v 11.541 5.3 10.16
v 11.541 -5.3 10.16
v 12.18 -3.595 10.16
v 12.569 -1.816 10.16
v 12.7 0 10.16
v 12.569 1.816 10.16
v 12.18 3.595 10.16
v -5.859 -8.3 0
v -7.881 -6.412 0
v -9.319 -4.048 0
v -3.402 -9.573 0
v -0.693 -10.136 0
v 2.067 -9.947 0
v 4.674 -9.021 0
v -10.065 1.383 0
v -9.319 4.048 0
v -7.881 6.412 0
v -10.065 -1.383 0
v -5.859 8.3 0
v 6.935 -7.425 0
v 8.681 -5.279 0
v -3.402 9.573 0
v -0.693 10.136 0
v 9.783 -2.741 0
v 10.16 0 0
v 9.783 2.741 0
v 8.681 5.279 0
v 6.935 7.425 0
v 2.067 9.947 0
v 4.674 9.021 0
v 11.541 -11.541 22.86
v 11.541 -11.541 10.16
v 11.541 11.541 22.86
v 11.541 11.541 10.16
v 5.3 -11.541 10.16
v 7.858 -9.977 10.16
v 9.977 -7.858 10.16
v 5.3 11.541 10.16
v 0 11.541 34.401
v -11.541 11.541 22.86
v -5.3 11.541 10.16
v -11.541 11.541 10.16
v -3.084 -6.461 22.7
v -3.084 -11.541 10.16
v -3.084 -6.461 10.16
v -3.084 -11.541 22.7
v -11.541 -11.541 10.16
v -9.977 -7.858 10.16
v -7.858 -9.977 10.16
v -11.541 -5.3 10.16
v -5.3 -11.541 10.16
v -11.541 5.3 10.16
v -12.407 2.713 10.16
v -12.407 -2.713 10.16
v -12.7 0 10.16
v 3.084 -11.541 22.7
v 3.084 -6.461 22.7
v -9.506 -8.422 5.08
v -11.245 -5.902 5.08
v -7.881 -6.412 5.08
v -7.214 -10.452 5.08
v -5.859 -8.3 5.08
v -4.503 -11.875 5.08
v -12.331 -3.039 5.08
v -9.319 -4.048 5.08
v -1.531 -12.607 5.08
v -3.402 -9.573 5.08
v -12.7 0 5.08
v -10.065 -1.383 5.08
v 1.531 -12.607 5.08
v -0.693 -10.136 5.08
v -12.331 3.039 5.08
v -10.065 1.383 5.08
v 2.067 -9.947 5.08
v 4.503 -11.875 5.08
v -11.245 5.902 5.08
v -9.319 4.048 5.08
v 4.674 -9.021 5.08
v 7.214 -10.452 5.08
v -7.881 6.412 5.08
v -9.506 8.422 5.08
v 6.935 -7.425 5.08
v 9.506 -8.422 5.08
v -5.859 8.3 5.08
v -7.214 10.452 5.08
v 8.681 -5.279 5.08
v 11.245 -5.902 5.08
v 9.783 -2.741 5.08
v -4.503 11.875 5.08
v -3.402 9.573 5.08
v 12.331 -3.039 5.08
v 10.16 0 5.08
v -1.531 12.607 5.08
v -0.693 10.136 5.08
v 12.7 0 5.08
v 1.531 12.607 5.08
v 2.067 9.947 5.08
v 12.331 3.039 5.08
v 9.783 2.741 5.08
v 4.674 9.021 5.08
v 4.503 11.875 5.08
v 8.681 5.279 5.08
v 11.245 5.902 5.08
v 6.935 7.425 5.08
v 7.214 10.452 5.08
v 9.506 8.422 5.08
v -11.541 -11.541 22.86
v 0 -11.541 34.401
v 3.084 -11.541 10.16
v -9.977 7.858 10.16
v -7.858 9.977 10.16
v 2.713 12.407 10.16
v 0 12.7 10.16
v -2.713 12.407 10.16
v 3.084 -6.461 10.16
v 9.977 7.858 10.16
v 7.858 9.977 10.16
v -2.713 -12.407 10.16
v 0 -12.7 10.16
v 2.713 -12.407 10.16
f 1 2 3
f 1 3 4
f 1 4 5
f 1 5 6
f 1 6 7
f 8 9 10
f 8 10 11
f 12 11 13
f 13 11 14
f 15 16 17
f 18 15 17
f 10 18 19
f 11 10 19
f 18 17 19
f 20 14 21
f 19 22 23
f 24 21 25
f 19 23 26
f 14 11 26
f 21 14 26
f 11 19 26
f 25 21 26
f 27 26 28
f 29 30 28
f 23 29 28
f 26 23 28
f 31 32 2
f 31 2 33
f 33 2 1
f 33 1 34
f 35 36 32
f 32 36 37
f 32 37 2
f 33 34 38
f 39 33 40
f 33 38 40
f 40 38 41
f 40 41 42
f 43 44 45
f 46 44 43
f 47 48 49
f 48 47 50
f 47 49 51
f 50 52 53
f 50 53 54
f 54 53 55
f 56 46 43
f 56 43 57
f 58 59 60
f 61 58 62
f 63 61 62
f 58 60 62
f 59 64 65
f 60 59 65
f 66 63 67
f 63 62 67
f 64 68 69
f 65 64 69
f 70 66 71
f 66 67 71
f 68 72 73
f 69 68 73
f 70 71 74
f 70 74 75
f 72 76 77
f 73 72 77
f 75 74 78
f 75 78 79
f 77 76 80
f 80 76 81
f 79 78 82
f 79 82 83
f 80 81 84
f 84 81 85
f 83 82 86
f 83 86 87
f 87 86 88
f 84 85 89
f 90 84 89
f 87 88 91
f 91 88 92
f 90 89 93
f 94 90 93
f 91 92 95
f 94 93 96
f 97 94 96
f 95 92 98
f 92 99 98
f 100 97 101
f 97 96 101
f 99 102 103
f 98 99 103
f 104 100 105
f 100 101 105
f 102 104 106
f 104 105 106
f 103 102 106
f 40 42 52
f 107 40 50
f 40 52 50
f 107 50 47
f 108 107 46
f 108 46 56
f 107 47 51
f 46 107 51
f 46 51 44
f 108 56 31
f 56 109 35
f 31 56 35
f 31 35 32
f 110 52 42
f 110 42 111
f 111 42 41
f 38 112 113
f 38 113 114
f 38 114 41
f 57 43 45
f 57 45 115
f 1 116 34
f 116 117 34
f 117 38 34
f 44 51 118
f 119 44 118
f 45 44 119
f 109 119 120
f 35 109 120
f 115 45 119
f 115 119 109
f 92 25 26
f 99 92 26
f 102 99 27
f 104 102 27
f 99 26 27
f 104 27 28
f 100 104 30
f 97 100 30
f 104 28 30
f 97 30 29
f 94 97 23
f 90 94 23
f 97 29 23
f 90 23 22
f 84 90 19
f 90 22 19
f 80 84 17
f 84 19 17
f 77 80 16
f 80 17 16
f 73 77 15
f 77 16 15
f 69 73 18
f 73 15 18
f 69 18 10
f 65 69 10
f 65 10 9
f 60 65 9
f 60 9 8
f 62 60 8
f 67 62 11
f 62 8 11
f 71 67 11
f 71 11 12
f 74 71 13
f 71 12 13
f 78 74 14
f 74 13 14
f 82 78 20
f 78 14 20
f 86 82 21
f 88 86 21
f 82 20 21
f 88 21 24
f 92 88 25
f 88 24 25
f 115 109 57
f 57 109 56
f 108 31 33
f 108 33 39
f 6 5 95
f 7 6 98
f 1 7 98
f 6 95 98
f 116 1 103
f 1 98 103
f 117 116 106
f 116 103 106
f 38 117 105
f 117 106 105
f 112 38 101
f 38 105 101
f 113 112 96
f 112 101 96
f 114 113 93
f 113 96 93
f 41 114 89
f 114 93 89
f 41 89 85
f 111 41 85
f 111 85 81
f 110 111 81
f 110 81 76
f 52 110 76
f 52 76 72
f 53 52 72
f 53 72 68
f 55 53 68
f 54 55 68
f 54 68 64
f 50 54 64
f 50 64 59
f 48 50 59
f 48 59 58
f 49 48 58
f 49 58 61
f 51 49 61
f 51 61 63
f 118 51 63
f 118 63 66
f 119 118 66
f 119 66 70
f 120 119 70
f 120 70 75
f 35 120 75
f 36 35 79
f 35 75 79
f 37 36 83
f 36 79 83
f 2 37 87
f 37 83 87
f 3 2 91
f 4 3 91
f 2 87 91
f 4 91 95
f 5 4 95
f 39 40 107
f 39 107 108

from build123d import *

# Parameters (mm, degrees)
F0_R        = 10.16
F1_DEPTH    = 5.08
F2_R        = 12.7
F2_R_2      = 10.16
F3_DEPTH    = 5.08
F5_DEPTH    = 25.4
F6_T1_DEPTH = 88.4028561312
F7_W        = 6.1679999344
F7_H        = 12.5403126109
F8_DEPTH    = 5.08


# Not quite as in the source:
# - a fillet or chamfer that OpenCascade refuses, or shapes differently, is made with other operations: its cross-section is extruded or revolved along the edge and cut away or added


with BuildPart() as f1:
    # F0 (on Top) → F1 (new body)
    with BuildSketch(Plane.XY):
        Circle(F0_R)
    extrude(amount=F1_DEPTH)

    # F2 (on face) → F3 (join)
    with BuildSketch(Plane.XY.offset(5.08)):
        Circle(F2_R)
        Circle(F2_R_2, mode=Mode.SUBTRACT)
        Circle(F2_R_2)
    extrude(amount=F3_DEPTH)

    # F4 (on face) → F5 (join)
    with BuildSketch(Plane.XY.offset(10.16)):
        with BuildLine():
            Line((-5.3003839328, -11.5410541184), (0, -11.5410541184))
            Line((0, -11.5410541184), (5.3003839328, -11.5410541184))
            ThreePointArc((5.3003839328, -11.5410541184), (7.254211996, -10.4243181224), (8.9802561211, -8.9802561211))
            ThreePointArc((8.9802561211, -8.9802561211), (10.4243181224, -7.254211996), (11.5410541184, -5.3003839328))
            Line((11.5410541184, -5.3003839328), (11.5410541184, 0))
            Line((11.5410541184, 0), (11.5410541184, 5.3003839328))
            ThreePointArc((11.5410541184, 5.3003839328), (8.9802561211, 8.9802561211), (5.3003839328, 11.5410541184))
            Line((5.3003839328, 11.5410541184), (-5.3003839328, 11.5410541184))
            ThreePointArc((-5.3003839328, 11.5410541184), (-8.9802561211, 8.9802561211), (-11.5410541184, 5.3003839328))
            Line((-11.5410541184, 5.3003839328), (-11.5410541184, -5.3003839328))
            ThreePointArc((-11.5410541184, -5.3003839328), (-8.9802561211, -8.9802561211), (-5.3003839328, -11.5410541184))
        make_face()
        with BuildLine():
            Line((-11.5410541184, -11.5410541184), (-5.3003839328, -11.5410541184))
            ThreePointArc((-5.3003839328, -11.5410541184), (-8.9802561211, -8.9802561211), (-11.5410541184, -5.3003839328))
            Line((-11.5410541184, -5.3003839328), (-11.5410541184, -11.5410541184))
        make_face()
        with BuildLine():
            Line((8.9802561211, -8.9802561211), (11.5410541184, -11.5410541184))
            Line((11.5410541184, -11.5410541184), (11.5410541184, -5.3003839328))
            ThreePointArc((11.5410541184, -5.3003839328), (10.4243181224, -7.254211996), (8.9802561211, -8.9802561211))
        make_face()
        with BuildLine():
            ThreePointArc((8.9802561211, -8.9802561211), (7.254211996, -10.4243181224), (5.3003839328, -11.5410541184))
            Line((5.3003839328, -11.5410541184), (11.5410541184, -11.5410541184))
            Line((11.5410541184, -11.5410541184), (8.9802561211, -8.9802561211))
        make_face()
        with BuildLine():
            Line((-11.5410541184, 11.5410541184), (-11.5410541184, 5.3003839328))
            ThreePointArc((-11.5410541184, 5.3003839328), (-8.9802561211, 8.9802561211), (-5.3003839328, 11.5410541184))
            Line((-5.3003839328, 11.5410541184), (-11.5410541184, 11.5410541184))
        make_face()
        with BuildLine():
            ThreePointArc((5.3003839328, 11.5410541184), (8.9802561211, 8.9802561211), (11.5410541184, 5.3003839328))
            Line((11.5410541184, 5.3003839328), (11.5410541184, 11.5410541184))
            Line((11.5410541184, 11.5410541184), (5.3003839328, 11.5410541184))
        make_face()
    extrude(amount=F5_DEPTH)

    # F6: chamfer of 12.7 on 2 edges, made by hand

    # F6_s2 → F6_t1 (cut)
    with BuildSketch(Plane.XZ.offset(-44.2014280656)):
        Polygon((11.5410541184, 22.86), (-1.1589458816, 35.56), (11.5410541184, 35.56), align=None)
        Polygon((-11.5410541184, 22.86), (1.1589458816, 35.56), (-11.5410541184, 35.56), align=None)
    extrude(amount=F6_T1_DEPTH, mode=Mode.SUBTRACT)

    # F7 (on face) → F8 (cut)
    with BuildSketch(Plane.XZ.offset(11.5410541184)):
        with Locations((0, 16.4301563054)):
            Rectangle(F7_W, F7_H)
    extrude(amount=-F8_DEPTH, mode=Mode.SUBTRACT)


solid = f1.part
